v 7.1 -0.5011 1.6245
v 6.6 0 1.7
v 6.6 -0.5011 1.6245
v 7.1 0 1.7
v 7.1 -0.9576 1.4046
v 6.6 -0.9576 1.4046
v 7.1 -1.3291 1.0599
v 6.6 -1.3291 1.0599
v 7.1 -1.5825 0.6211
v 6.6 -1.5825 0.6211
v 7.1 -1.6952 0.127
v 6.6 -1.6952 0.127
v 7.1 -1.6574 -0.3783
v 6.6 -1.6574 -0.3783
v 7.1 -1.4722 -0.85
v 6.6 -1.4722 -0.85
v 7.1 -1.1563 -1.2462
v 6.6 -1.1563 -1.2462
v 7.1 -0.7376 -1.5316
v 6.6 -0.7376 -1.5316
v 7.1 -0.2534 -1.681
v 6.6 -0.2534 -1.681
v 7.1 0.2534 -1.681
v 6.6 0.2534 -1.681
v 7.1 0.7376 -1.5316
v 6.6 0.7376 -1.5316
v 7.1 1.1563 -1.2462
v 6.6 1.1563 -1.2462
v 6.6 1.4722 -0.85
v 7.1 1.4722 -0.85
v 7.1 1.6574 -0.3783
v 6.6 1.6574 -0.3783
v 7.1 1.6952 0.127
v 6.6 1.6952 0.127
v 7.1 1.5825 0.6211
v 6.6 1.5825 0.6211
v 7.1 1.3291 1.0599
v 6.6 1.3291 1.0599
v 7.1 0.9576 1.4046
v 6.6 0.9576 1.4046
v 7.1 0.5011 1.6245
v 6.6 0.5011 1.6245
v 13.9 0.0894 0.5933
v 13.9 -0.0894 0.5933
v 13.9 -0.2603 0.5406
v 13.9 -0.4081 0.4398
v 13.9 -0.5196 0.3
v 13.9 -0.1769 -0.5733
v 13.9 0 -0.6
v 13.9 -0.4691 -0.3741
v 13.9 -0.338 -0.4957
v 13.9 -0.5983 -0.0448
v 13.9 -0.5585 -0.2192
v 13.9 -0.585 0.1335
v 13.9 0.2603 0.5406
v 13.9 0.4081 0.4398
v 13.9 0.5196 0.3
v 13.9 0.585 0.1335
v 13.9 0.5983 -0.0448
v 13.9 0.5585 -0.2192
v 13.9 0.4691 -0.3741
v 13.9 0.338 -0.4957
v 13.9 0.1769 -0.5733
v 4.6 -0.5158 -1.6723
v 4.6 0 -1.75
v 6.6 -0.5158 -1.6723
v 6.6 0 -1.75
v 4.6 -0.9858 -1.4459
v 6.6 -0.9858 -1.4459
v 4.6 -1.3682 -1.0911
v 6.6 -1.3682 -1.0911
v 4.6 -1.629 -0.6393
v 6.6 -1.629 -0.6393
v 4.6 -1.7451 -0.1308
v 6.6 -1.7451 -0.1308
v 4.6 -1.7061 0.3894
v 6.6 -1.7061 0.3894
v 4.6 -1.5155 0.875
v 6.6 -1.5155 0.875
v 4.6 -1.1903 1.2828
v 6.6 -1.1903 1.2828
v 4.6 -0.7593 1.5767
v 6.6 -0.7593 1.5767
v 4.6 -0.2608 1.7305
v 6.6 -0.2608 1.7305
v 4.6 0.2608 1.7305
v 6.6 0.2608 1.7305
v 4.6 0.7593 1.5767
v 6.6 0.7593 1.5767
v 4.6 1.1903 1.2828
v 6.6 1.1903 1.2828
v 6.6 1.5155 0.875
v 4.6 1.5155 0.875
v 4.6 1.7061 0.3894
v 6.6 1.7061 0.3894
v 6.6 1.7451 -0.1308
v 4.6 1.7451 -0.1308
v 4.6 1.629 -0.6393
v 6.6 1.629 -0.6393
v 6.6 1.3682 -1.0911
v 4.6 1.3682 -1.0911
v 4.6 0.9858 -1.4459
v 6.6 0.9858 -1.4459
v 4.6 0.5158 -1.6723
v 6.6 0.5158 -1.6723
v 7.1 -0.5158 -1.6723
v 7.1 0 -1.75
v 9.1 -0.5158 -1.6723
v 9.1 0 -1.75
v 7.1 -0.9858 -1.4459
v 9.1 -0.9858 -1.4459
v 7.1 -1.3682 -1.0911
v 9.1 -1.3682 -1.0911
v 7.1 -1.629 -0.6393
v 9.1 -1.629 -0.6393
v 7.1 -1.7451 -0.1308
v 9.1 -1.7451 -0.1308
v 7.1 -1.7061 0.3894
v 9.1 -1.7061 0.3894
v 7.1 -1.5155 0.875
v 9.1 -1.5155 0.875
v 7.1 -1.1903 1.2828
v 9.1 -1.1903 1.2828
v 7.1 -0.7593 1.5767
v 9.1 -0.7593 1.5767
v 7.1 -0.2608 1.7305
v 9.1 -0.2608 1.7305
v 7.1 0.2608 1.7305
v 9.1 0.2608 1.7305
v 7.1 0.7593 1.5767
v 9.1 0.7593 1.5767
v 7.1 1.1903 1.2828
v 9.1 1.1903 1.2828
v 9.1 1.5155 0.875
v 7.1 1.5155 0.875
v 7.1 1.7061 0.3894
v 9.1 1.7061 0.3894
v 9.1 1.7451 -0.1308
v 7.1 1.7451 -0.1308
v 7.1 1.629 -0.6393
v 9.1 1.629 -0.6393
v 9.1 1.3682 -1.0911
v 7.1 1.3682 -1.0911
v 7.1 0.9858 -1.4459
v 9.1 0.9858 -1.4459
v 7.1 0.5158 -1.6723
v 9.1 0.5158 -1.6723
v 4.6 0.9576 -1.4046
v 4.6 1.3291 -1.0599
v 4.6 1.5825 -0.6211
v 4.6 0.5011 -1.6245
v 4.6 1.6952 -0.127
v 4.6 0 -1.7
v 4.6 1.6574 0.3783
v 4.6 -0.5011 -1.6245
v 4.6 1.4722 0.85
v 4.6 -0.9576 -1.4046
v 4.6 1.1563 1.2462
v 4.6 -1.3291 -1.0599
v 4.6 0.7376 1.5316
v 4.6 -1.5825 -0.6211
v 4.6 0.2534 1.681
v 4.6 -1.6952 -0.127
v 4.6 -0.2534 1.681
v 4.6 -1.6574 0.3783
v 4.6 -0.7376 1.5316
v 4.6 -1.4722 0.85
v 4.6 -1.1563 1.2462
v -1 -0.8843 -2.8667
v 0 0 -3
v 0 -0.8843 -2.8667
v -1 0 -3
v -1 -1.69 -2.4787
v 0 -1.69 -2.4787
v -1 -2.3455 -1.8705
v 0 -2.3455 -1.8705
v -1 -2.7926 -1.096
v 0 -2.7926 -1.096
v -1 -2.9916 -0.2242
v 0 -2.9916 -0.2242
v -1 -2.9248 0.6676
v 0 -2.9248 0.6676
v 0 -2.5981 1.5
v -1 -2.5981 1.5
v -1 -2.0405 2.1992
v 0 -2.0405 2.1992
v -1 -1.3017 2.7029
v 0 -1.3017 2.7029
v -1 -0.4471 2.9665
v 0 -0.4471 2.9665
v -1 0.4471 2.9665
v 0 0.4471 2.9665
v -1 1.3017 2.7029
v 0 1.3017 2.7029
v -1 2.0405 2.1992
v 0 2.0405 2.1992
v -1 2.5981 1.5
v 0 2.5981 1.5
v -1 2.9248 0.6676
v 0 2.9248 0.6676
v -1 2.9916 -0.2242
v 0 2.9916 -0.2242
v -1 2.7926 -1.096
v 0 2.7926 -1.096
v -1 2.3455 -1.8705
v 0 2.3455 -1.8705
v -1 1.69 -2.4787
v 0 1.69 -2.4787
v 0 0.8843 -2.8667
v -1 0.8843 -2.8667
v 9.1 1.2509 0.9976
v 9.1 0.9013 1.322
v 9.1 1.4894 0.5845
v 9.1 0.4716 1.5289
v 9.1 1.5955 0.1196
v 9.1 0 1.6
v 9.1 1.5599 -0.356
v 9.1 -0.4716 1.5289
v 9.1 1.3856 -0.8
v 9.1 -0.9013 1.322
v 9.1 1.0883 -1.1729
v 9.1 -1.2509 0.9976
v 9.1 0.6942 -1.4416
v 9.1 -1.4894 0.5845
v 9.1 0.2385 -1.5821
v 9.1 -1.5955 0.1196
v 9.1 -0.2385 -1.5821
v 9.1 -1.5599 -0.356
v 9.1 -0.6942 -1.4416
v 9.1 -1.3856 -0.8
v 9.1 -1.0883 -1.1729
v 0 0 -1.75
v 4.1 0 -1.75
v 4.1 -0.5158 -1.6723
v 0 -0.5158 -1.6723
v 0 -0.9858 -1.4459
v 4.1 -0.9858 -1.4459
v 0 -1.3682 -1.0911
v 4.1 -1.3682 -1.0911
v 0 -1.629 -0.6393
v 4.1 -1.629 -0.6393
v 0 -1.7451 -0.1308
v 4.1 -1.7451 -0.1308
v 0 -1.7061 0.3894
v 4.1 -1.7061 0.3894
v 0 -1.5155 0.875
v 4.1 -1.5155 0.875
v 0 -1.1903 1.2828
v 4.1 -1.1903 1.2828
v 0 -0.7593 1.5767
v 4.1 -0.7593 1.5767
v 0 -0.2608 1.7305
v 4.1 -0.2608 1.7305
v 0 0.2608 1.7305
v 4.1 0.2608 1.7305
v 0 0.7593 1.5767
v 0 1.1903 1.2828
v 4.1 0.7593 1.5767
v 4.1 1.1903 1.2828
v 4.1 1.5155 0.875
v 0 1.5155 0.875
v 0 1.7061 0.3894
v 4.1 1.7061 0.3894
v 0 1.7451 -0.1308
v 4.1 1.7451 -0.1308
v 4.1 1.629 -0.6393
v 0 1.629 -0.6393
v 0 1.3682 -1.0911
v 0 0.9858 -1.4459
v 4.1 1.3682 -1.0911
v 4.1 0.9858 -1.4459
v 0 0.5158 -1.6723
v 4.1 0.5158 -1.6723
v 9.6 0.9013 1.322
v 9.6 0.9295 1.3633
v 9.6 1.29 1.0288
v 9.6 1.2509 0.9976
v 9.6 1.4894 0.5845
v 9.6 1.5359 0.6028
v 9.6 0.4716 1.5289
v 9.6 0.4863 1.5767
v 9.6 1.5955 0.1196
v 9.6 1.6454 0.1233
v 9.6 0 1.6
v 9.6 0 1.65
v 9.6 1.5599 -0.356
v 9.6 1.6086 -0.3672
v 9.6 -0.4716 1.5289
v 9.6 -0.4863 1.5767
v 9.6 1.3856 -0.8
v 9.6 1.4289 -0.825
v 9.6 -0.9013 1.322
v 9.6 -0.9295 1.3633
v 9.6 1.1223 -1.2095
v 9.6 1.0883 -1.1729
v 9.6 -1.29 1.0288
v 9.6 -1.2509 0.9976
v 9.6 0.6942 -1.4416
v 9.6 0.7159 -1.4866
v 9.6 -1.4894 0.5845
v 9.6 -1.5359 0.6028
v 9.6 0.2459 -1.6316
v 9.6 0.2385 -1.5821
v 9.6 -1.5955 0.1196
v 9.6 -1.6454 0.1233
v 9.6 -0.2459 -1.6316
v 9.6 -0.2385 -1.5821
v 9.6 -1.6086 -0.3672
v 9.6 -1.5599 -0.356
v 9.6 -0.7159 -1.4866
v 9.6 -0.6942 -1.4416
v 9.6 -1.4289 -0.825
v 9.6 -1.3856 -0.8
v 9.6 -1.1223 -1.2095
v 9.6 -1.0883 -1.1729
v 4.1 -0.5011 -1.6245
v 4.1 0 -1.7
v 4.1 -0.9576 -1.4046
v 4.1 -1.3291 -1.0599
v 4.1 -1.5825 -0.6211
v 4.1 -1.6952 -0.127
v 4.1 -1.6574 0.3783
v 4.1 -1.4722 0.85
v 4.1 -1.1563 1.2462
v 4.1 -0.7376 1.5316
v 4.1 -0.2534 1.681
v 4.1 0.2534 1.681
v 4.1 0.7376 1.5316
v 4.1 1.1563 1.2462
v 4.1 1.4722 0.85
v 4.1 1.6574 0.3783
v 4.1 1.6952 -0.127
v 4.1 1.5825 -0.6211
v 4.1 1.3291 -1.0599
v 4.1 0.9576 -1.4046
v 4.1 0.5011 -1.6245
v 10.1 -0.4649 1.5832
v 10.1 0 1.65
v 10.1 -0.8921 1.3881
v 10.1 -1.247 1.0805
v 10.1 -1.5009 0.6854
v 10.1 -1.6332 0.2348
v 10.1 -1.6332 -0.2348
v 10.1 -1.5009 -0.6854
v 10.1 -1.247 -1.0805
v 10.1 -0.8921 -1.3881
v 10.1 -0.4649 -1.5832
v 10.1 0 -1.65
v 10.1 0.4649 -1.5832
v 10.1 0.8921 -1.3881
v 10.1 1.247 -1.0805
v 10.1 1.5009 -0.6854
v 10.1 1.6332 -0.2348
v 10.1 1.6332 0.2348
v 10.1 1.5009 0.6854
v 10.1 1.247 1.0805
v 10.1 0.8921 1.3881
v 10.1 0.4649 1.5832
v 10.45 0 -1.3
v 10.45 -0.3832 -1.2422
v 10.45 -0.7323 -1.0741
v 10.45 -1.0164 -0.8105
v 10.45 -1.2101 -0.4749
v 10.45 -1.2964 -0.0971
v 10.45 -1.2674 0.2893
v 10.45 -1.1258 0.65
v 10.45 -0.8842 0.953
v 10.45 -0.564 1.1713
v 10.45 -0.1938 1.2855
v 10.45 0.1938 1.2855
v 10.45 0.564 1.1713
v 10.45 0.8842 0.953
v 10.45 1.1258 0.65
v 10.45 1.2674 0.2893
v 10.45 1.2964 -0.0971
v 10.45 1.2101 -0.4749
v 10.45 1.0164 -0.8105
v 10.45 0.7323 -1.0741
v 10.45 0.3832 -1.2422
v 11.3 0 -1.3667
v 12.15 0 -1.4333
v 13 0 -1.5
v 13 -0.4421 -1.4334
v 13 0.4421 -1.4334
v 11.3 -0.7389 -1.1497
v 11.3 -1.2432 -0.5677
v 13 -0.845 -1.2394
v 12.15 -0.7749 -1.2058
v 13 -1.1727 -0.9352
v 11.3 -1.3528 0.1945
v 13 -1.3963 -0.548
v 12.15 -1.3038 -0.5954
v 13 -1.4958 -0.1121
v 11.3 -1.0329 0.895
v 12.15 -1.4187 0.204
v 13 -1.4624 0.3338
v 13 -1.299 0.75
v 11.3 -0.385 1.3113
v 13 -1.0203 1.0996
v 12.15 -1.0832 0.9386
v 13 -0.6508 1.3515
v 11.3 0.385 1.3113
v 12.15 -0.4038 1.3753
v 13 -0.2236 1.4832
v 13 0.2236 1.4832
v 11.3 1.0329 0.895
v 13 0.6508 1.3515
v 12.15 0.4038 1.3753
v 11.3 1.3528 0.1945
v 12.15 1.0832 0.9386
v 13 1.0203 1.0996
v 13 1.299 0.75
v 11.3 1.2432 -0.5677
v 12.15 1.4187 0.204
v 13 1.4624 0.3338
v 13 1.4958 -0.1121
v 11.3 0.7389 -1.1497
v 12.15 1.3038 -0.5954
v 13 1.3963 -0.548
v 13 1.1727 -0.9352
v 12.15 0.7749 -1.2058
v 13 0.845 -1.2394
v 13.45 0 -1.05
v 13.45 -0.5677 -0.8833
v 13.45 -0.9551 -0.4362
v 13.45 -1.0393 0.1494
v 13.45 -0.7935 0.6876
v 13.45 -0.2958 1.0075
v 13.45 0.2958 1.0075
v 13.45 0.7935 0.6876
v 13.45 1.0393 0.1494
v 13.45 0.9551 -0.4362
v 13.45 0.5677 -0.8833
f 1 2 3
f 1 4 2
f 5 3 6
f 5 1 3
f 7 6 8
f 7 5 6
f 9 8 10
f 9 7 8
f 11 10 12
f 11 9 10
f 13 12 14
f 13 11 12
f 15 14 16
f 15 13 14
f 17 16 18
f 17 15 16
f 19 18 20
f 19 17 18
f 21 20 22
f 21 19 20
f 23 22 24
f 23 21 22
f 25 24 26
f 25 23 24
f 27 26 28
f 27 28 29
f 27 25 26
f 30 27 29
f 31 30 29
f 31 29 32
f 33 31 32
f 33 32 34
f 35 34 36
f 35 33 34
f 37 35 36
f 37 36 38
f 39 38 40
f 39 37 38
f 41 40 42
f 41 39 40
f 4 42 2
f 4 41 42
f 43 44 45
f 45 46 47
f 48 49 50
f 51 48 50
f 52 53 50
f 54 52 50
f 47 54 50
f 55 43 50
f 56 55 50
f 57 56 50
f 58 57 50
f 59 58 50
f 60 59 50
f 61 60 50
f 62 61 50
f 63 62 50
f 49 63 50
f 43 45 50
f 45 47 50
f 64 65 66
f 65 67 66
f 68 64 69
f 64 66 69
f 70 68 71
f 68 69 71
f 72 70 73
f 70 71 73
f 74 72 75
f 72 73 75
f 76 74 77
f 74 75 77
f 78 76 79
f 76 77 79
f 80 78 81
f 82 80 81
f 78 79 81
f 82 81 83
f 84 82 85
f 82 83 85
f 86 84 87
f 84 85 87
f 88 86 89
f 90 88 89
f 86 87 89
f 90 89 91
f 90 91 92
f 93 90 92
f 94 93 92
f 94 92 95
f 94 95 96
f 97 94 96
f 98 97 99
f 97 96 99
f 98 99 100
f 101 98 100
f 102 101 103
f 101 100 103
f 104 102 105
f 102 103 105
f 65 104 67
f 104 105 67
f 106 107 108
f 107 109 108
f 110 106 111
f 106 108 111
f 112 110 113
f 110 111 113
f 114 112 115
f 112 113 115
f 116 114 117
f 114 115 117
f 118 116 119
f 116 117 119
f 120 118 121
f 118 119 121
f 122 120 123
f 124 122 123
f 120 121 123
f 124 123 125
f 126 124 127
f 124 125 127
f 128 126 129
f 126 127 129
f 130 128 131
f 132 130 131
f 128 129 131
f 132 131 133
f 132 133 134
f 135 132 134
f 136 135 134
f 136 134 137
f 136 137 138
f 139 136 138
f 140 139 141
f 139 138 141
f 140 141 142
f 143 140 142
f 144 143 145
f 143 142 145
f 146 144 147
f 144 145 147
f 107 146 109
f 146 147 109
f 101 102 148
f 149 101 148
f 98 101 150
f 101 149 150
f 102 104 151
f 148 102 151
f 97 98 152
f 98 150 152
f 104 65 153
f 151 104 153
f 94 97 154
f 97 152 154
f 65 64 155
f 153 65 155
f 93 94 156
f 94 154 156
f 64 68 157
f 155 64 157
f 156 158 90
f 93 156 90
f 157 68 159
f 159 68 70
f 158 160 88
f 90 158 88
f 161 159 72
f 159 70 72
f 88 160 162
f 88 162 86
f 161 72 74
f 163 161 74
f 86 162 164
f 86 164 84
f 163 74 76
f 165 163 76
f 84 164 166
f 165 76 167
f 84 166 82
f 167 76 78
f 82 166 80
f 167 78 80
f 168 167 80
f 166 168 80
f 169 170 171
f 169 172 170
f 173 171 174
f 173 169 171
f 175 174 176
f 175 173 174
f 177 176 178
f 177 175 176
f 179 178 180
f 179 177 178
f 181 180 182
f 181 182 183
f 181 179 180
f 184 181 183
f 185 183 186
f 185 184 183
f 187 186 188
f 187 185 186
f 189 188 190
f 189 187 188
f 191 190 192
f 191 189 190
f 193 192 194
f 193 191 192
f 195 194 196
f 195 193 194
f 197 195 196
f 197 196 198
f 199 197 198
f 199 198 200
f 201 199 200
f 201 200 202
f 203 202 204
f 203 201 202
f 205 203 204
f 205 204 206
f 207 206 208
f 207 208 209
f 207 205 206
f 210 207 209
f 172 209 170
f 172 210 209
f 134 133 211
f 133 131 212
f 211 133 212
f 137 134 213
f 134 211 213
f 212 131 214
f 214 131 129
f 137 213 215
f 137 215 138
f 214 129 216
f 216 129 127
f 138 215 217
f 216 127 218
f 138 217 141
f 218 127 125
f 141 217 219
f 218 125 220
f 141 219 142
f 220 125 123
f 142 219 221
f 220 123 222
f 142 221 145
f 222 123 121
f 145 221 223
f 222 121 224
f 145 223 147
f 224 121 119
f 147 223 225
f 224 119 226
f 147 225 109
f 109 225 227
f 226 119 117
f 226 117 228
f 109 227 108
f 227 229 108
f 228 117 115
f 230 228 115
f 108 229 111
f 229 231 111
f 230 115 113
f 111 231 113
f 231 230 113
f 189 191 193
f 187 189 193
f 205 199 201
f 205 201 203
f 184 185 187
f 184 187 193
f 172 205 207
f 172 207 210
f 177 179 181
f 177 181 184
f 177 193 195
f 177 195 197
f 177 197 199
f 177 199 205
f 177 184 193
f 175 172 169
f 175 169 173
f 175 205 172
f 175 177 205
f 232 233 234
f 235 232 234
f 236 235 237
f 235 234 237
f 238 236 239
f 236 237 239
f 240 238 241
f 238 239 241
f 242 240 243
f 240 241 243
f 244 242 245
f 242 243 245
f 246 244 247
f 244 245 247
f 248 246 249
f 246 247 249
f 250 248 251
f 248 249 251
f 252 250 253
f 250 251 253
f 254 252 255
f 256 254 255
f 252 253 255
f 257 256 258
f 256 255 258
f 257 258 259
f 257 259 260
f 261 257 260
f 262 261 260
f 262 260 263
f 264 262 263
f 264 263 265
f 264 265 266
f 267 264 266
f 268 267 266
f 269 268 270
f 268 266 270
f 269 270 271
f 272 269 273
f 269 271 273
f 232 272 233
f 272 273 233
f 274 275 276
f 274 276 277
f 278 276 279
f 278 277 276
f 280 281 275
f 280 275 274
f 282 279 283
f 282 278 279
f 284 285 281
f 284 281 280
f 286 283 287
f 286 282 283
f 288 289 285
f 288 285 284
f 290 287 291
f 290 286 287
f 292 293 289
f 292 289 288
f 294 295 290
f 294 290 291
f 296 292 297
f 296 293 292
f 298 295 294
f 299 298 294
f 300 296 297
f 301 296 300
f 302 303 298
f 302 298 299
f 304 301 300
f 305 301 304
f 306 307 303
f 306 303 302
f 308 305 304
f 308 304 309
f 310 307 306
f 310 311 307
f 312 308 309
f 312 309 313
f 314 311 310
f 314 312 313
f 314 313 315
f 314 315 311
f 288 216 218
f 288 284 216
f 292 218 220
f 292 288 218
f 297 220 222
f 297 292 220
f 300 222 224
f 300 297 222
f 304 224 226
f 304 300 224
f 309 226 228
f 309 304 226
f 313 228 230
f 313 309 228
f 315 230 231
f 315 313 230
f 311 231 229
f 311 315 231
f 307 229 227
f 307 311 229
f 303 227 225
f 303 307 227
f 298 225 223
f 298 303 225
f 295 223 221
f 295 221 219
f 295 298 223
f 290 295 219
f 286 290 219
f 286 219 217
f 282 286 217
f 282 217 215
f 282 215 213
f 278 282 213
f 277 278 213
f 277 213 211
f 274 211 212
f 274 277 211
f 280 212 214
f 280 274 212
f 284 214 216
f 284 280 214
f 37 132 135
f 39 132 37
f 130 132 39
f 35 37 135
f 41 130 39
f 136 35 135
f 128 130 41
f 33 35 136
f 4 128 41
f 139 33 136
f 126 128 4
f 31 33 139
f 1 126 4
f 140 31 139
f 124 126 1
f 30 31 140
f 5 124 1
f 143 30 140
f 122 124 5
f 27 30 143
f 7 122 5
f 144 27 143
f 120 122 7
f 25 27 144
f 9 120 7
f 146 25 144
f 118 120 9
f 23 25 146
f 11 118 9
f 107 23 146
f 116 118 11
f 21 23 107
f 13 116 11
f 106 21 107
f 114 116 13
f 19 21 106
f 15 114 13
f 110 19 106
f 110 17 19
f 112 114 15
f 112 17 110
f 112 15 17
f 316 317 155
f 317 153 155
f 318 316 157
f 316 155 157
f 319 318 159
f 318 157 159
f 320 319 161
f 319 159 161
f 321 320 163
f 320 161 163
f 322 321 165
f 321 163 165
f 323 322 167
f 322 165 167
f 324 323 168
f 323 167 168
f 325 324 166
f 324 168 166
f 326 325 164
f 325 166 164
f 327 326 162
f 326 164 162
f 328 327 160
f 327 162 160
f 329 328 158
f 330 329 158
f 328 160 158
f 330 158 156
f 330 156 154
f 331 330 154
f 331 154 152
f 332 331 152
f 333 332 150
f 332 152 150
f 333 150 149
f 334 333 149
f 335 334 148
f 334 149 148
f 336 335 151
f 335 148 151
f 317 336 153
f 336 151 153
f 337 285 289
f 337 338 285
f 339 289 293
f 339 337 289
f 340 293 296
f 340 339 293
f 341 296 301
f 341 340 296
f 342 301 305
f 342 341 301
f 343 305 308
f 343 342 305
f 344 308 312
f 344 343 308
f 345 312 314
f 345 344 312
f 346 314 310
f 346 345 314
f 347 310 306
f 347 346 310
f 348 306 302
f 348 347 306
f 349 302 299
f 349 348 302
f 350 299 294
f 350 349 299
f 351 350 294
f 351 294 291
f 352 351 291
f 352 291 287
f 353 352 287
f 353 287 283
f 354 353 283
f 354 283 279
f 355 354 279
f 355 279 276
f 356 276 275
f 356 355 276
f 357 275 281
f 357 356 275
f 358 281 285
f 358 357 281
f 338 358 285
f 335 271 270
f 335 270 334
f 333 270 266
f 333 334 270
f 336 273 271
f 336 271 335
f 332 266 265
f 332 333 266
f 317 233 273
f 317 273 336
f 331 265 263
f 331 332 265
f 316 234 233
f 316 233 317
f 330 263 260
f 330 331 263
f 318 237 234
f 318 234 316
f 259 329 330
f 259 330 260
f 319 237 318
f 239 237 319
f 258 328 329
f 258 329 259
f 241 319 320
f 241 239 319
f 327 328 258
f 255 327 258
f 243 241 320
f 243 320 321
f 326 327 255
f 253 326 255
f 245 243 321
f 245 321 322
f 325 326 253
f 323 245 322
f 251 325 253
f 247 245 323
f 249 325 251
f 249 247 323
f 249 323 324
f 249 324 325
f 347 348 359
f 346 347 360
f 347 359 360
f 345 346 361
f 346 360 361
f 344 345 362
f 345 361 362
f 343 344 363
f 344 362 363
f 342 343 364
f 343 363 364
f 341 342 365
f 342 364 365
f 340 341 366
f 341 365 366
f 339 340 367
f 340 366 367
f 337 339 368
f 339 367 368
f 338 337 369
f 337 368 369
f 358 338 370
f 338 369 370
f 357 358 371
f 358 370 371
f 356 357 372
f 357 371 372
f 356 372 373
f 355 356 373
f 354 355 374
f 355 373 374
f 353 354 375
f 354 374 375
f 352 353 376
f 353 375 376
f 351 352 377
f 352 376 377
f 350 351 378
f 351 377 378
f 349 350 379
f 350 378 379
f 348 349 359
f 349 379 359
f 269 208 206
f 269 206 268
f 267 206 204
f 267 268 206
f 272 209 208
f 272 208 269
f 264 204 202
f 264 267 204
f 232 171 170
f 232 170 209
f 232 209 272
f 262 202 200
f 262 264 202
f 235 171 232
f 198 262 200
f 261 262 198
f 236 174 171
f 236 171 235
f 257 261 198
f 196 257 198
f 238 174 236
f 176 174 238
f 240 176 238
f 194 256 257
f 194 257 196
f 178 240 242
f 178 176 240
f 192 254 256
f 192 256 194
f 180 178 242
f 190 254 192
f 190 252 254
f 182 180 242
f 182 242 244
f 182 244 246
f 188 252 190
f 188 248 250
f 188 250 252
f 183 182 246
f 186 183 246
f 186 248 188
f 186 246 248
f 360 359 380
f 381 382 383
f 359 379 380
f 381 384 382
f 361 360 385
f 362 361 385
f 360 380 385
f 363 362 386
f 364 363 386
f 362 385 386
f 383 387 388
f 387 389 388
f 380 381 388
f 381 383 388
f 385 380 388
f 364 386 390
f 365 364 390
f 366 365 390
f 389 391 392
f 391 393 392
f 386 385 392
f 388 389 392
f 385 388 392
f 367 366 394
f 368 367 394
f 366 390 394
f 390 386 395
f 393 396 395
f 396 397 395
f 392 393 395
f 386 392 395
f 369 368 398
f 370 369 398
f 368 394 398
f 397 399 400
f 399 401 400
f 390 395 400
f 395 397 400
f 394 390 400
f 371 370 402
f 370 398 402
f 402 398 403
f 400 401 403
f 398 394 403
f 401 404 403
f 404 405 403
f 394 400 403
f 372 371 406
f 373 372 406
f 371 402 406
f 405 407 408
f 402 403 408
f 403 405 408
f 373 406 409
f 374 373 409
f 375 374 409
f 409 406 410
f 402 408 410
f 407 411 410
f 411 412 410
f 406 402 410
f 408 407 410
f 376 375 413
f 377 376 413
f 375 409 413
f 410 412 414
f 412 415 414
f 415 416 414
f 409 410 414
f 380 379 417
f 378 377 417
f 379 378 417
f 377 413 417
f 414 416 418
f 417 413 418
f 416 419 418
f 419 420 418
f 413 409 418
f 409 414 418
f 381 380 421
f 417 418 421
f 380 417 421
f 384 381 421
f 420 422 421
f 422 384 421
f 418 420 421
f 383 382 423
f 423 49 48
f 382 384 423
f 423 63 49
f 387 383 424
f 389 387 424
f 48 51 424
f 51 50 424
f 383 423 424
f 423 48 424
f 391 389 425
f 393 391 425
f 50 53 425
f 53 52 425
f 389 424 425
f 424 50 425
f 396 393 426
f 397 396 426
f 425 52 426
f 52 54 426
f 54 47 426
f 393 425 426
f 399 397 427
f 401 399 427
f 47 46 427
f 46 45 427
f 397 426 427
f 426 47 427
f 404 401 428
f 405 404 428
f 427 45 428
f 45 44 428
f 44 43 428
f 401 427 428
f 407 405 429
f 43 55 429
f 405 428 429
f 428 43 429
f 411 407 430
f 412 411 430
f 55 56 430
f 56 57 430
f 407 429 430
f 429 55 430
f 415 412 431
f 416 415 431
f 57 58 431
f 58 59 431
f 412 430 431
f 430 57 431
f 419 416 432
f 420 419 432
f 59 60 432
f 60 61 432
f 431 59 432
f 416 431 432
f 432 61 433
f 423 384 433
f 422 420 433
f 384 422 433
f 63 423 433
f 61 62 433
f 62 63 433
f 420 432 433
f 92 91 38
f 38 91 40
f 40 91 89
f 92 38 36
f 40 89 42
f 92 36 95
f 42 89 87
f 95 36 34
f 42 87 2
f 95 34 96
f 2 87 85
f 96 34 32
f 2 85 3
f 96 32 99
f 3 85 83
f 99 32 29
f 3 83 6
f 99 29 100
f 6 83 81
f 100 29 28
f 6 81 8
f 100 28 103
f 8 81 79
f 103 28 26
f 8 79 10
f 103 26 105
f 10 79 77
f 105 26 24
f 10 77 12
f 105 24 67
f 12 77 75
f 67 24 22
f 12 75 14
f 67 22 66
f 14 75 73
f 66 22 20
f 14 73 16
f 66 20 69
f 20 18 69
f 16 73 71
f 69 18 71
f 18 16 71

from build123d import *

# Parameters (mm, degrees)
ESQUISSE2_W = 1
ESQUISSE2_H = 0.1
ESQUISSE3_W = 0.5
ESQUISSE3_H = 0.05
ESQUISSE4_W = 0.5
ESQUISSE4_H = 0.05
ESQUISSE5_W = 0.5
ESQUISSE5_H = 0.05


with BuildPart() as part:
    # Esquisse1 → Révolution1 (revolve)
    with BuildSketch(Plane.XY, mode=Mode.PRIVATE) as r_volution1_sk:
        Polygon((0, 0), (0, 1.75), (10, 1.75), (10.45, 1.3), (13, 1.5), (13.9, 0.6), (13.9, 0), align=None)
        Polygon((-1, 0), (0, 0), (0, 1.75), (0, 3), (-1, 3), align=None)
    revolve(r_volution1_sk.sketch.rotate(Axis((13.9, 0, 0), (-1, 0, 0)), 90), axis=Axis((13.9, 0, 0), (-1, 0, 0)))

    # Esquisse2 → End of connector (revolve, cut)
    with BuildSketch(Plane.XY, mode=Mode.PRIVATE) as end_of_connector_sk:
        with Locations((9.6, 1.7)):
            Rectangle(ESQUISSE2_W, ESQUISSE2_H)
    revolve(end_of_connector_sk.sketch.rotate(Axis((0, 0, 0), (1, 0, 0)), 90), axis=Axis((0, 0, 0), (1, 0, 0)), mode=Mode.SUBTRACT)

    # Esquisse3 → First connector separation (revolve, cut)
    with BuildSketch(Plane.XY, mode=Mode.PRIVATE) as first_connector_separation_sk:
        with Locations((9.35, 1.625)):
            Rectangle(ESQUISSE3_W, ESQUISSE3_H)
    revolve(first_connector_separation_sk.sketch.rotate(Axis((13.9, 0, 0), (1, 0, 0)), 90), axis=Axis((13.9, 0, 0), (1, 0, 0)), mode=Mode.SUBTRACT)

    # Esquisse4 → Second connector separation (revolve, cut)
    with BuildSketch(Plane.XY, mode=Mode.PRIVATE) as second_connector_separation_sk:
        with Locations((6.85, 1.725)):
            Rectangle(ESQUISSE4_W, ESQUISSE4_H)
    revolve(second_connector_separation_sk.sketch.rotate(Axis((13.9, 0, 0), (1, 0, 0)), 90), axis=Axis((13.9, 0, 0), (1, 0, 0)), mode=Mode.SUBTRACT)

    # Esquisse5 → Third connector sepatation (revolve, cut)
    with BuildSketch(Plane.XY, mode=Mode.PRIVATE) as third_connector_sepatation_sk:
        with Locations((4.35, 1.725)):
            Rectangle(ESQUISSE5_W, ESQUISSE5_H)
    revolve(third_connector_sepatation_sk.sketch.rotate(Axis((0, 0, 0), (-1, 0, 0)), 90), axis=Axis((0, 0, 0), (-1, 0, 0)), mode=Mode.SUBTRACT)


solid = part.part
